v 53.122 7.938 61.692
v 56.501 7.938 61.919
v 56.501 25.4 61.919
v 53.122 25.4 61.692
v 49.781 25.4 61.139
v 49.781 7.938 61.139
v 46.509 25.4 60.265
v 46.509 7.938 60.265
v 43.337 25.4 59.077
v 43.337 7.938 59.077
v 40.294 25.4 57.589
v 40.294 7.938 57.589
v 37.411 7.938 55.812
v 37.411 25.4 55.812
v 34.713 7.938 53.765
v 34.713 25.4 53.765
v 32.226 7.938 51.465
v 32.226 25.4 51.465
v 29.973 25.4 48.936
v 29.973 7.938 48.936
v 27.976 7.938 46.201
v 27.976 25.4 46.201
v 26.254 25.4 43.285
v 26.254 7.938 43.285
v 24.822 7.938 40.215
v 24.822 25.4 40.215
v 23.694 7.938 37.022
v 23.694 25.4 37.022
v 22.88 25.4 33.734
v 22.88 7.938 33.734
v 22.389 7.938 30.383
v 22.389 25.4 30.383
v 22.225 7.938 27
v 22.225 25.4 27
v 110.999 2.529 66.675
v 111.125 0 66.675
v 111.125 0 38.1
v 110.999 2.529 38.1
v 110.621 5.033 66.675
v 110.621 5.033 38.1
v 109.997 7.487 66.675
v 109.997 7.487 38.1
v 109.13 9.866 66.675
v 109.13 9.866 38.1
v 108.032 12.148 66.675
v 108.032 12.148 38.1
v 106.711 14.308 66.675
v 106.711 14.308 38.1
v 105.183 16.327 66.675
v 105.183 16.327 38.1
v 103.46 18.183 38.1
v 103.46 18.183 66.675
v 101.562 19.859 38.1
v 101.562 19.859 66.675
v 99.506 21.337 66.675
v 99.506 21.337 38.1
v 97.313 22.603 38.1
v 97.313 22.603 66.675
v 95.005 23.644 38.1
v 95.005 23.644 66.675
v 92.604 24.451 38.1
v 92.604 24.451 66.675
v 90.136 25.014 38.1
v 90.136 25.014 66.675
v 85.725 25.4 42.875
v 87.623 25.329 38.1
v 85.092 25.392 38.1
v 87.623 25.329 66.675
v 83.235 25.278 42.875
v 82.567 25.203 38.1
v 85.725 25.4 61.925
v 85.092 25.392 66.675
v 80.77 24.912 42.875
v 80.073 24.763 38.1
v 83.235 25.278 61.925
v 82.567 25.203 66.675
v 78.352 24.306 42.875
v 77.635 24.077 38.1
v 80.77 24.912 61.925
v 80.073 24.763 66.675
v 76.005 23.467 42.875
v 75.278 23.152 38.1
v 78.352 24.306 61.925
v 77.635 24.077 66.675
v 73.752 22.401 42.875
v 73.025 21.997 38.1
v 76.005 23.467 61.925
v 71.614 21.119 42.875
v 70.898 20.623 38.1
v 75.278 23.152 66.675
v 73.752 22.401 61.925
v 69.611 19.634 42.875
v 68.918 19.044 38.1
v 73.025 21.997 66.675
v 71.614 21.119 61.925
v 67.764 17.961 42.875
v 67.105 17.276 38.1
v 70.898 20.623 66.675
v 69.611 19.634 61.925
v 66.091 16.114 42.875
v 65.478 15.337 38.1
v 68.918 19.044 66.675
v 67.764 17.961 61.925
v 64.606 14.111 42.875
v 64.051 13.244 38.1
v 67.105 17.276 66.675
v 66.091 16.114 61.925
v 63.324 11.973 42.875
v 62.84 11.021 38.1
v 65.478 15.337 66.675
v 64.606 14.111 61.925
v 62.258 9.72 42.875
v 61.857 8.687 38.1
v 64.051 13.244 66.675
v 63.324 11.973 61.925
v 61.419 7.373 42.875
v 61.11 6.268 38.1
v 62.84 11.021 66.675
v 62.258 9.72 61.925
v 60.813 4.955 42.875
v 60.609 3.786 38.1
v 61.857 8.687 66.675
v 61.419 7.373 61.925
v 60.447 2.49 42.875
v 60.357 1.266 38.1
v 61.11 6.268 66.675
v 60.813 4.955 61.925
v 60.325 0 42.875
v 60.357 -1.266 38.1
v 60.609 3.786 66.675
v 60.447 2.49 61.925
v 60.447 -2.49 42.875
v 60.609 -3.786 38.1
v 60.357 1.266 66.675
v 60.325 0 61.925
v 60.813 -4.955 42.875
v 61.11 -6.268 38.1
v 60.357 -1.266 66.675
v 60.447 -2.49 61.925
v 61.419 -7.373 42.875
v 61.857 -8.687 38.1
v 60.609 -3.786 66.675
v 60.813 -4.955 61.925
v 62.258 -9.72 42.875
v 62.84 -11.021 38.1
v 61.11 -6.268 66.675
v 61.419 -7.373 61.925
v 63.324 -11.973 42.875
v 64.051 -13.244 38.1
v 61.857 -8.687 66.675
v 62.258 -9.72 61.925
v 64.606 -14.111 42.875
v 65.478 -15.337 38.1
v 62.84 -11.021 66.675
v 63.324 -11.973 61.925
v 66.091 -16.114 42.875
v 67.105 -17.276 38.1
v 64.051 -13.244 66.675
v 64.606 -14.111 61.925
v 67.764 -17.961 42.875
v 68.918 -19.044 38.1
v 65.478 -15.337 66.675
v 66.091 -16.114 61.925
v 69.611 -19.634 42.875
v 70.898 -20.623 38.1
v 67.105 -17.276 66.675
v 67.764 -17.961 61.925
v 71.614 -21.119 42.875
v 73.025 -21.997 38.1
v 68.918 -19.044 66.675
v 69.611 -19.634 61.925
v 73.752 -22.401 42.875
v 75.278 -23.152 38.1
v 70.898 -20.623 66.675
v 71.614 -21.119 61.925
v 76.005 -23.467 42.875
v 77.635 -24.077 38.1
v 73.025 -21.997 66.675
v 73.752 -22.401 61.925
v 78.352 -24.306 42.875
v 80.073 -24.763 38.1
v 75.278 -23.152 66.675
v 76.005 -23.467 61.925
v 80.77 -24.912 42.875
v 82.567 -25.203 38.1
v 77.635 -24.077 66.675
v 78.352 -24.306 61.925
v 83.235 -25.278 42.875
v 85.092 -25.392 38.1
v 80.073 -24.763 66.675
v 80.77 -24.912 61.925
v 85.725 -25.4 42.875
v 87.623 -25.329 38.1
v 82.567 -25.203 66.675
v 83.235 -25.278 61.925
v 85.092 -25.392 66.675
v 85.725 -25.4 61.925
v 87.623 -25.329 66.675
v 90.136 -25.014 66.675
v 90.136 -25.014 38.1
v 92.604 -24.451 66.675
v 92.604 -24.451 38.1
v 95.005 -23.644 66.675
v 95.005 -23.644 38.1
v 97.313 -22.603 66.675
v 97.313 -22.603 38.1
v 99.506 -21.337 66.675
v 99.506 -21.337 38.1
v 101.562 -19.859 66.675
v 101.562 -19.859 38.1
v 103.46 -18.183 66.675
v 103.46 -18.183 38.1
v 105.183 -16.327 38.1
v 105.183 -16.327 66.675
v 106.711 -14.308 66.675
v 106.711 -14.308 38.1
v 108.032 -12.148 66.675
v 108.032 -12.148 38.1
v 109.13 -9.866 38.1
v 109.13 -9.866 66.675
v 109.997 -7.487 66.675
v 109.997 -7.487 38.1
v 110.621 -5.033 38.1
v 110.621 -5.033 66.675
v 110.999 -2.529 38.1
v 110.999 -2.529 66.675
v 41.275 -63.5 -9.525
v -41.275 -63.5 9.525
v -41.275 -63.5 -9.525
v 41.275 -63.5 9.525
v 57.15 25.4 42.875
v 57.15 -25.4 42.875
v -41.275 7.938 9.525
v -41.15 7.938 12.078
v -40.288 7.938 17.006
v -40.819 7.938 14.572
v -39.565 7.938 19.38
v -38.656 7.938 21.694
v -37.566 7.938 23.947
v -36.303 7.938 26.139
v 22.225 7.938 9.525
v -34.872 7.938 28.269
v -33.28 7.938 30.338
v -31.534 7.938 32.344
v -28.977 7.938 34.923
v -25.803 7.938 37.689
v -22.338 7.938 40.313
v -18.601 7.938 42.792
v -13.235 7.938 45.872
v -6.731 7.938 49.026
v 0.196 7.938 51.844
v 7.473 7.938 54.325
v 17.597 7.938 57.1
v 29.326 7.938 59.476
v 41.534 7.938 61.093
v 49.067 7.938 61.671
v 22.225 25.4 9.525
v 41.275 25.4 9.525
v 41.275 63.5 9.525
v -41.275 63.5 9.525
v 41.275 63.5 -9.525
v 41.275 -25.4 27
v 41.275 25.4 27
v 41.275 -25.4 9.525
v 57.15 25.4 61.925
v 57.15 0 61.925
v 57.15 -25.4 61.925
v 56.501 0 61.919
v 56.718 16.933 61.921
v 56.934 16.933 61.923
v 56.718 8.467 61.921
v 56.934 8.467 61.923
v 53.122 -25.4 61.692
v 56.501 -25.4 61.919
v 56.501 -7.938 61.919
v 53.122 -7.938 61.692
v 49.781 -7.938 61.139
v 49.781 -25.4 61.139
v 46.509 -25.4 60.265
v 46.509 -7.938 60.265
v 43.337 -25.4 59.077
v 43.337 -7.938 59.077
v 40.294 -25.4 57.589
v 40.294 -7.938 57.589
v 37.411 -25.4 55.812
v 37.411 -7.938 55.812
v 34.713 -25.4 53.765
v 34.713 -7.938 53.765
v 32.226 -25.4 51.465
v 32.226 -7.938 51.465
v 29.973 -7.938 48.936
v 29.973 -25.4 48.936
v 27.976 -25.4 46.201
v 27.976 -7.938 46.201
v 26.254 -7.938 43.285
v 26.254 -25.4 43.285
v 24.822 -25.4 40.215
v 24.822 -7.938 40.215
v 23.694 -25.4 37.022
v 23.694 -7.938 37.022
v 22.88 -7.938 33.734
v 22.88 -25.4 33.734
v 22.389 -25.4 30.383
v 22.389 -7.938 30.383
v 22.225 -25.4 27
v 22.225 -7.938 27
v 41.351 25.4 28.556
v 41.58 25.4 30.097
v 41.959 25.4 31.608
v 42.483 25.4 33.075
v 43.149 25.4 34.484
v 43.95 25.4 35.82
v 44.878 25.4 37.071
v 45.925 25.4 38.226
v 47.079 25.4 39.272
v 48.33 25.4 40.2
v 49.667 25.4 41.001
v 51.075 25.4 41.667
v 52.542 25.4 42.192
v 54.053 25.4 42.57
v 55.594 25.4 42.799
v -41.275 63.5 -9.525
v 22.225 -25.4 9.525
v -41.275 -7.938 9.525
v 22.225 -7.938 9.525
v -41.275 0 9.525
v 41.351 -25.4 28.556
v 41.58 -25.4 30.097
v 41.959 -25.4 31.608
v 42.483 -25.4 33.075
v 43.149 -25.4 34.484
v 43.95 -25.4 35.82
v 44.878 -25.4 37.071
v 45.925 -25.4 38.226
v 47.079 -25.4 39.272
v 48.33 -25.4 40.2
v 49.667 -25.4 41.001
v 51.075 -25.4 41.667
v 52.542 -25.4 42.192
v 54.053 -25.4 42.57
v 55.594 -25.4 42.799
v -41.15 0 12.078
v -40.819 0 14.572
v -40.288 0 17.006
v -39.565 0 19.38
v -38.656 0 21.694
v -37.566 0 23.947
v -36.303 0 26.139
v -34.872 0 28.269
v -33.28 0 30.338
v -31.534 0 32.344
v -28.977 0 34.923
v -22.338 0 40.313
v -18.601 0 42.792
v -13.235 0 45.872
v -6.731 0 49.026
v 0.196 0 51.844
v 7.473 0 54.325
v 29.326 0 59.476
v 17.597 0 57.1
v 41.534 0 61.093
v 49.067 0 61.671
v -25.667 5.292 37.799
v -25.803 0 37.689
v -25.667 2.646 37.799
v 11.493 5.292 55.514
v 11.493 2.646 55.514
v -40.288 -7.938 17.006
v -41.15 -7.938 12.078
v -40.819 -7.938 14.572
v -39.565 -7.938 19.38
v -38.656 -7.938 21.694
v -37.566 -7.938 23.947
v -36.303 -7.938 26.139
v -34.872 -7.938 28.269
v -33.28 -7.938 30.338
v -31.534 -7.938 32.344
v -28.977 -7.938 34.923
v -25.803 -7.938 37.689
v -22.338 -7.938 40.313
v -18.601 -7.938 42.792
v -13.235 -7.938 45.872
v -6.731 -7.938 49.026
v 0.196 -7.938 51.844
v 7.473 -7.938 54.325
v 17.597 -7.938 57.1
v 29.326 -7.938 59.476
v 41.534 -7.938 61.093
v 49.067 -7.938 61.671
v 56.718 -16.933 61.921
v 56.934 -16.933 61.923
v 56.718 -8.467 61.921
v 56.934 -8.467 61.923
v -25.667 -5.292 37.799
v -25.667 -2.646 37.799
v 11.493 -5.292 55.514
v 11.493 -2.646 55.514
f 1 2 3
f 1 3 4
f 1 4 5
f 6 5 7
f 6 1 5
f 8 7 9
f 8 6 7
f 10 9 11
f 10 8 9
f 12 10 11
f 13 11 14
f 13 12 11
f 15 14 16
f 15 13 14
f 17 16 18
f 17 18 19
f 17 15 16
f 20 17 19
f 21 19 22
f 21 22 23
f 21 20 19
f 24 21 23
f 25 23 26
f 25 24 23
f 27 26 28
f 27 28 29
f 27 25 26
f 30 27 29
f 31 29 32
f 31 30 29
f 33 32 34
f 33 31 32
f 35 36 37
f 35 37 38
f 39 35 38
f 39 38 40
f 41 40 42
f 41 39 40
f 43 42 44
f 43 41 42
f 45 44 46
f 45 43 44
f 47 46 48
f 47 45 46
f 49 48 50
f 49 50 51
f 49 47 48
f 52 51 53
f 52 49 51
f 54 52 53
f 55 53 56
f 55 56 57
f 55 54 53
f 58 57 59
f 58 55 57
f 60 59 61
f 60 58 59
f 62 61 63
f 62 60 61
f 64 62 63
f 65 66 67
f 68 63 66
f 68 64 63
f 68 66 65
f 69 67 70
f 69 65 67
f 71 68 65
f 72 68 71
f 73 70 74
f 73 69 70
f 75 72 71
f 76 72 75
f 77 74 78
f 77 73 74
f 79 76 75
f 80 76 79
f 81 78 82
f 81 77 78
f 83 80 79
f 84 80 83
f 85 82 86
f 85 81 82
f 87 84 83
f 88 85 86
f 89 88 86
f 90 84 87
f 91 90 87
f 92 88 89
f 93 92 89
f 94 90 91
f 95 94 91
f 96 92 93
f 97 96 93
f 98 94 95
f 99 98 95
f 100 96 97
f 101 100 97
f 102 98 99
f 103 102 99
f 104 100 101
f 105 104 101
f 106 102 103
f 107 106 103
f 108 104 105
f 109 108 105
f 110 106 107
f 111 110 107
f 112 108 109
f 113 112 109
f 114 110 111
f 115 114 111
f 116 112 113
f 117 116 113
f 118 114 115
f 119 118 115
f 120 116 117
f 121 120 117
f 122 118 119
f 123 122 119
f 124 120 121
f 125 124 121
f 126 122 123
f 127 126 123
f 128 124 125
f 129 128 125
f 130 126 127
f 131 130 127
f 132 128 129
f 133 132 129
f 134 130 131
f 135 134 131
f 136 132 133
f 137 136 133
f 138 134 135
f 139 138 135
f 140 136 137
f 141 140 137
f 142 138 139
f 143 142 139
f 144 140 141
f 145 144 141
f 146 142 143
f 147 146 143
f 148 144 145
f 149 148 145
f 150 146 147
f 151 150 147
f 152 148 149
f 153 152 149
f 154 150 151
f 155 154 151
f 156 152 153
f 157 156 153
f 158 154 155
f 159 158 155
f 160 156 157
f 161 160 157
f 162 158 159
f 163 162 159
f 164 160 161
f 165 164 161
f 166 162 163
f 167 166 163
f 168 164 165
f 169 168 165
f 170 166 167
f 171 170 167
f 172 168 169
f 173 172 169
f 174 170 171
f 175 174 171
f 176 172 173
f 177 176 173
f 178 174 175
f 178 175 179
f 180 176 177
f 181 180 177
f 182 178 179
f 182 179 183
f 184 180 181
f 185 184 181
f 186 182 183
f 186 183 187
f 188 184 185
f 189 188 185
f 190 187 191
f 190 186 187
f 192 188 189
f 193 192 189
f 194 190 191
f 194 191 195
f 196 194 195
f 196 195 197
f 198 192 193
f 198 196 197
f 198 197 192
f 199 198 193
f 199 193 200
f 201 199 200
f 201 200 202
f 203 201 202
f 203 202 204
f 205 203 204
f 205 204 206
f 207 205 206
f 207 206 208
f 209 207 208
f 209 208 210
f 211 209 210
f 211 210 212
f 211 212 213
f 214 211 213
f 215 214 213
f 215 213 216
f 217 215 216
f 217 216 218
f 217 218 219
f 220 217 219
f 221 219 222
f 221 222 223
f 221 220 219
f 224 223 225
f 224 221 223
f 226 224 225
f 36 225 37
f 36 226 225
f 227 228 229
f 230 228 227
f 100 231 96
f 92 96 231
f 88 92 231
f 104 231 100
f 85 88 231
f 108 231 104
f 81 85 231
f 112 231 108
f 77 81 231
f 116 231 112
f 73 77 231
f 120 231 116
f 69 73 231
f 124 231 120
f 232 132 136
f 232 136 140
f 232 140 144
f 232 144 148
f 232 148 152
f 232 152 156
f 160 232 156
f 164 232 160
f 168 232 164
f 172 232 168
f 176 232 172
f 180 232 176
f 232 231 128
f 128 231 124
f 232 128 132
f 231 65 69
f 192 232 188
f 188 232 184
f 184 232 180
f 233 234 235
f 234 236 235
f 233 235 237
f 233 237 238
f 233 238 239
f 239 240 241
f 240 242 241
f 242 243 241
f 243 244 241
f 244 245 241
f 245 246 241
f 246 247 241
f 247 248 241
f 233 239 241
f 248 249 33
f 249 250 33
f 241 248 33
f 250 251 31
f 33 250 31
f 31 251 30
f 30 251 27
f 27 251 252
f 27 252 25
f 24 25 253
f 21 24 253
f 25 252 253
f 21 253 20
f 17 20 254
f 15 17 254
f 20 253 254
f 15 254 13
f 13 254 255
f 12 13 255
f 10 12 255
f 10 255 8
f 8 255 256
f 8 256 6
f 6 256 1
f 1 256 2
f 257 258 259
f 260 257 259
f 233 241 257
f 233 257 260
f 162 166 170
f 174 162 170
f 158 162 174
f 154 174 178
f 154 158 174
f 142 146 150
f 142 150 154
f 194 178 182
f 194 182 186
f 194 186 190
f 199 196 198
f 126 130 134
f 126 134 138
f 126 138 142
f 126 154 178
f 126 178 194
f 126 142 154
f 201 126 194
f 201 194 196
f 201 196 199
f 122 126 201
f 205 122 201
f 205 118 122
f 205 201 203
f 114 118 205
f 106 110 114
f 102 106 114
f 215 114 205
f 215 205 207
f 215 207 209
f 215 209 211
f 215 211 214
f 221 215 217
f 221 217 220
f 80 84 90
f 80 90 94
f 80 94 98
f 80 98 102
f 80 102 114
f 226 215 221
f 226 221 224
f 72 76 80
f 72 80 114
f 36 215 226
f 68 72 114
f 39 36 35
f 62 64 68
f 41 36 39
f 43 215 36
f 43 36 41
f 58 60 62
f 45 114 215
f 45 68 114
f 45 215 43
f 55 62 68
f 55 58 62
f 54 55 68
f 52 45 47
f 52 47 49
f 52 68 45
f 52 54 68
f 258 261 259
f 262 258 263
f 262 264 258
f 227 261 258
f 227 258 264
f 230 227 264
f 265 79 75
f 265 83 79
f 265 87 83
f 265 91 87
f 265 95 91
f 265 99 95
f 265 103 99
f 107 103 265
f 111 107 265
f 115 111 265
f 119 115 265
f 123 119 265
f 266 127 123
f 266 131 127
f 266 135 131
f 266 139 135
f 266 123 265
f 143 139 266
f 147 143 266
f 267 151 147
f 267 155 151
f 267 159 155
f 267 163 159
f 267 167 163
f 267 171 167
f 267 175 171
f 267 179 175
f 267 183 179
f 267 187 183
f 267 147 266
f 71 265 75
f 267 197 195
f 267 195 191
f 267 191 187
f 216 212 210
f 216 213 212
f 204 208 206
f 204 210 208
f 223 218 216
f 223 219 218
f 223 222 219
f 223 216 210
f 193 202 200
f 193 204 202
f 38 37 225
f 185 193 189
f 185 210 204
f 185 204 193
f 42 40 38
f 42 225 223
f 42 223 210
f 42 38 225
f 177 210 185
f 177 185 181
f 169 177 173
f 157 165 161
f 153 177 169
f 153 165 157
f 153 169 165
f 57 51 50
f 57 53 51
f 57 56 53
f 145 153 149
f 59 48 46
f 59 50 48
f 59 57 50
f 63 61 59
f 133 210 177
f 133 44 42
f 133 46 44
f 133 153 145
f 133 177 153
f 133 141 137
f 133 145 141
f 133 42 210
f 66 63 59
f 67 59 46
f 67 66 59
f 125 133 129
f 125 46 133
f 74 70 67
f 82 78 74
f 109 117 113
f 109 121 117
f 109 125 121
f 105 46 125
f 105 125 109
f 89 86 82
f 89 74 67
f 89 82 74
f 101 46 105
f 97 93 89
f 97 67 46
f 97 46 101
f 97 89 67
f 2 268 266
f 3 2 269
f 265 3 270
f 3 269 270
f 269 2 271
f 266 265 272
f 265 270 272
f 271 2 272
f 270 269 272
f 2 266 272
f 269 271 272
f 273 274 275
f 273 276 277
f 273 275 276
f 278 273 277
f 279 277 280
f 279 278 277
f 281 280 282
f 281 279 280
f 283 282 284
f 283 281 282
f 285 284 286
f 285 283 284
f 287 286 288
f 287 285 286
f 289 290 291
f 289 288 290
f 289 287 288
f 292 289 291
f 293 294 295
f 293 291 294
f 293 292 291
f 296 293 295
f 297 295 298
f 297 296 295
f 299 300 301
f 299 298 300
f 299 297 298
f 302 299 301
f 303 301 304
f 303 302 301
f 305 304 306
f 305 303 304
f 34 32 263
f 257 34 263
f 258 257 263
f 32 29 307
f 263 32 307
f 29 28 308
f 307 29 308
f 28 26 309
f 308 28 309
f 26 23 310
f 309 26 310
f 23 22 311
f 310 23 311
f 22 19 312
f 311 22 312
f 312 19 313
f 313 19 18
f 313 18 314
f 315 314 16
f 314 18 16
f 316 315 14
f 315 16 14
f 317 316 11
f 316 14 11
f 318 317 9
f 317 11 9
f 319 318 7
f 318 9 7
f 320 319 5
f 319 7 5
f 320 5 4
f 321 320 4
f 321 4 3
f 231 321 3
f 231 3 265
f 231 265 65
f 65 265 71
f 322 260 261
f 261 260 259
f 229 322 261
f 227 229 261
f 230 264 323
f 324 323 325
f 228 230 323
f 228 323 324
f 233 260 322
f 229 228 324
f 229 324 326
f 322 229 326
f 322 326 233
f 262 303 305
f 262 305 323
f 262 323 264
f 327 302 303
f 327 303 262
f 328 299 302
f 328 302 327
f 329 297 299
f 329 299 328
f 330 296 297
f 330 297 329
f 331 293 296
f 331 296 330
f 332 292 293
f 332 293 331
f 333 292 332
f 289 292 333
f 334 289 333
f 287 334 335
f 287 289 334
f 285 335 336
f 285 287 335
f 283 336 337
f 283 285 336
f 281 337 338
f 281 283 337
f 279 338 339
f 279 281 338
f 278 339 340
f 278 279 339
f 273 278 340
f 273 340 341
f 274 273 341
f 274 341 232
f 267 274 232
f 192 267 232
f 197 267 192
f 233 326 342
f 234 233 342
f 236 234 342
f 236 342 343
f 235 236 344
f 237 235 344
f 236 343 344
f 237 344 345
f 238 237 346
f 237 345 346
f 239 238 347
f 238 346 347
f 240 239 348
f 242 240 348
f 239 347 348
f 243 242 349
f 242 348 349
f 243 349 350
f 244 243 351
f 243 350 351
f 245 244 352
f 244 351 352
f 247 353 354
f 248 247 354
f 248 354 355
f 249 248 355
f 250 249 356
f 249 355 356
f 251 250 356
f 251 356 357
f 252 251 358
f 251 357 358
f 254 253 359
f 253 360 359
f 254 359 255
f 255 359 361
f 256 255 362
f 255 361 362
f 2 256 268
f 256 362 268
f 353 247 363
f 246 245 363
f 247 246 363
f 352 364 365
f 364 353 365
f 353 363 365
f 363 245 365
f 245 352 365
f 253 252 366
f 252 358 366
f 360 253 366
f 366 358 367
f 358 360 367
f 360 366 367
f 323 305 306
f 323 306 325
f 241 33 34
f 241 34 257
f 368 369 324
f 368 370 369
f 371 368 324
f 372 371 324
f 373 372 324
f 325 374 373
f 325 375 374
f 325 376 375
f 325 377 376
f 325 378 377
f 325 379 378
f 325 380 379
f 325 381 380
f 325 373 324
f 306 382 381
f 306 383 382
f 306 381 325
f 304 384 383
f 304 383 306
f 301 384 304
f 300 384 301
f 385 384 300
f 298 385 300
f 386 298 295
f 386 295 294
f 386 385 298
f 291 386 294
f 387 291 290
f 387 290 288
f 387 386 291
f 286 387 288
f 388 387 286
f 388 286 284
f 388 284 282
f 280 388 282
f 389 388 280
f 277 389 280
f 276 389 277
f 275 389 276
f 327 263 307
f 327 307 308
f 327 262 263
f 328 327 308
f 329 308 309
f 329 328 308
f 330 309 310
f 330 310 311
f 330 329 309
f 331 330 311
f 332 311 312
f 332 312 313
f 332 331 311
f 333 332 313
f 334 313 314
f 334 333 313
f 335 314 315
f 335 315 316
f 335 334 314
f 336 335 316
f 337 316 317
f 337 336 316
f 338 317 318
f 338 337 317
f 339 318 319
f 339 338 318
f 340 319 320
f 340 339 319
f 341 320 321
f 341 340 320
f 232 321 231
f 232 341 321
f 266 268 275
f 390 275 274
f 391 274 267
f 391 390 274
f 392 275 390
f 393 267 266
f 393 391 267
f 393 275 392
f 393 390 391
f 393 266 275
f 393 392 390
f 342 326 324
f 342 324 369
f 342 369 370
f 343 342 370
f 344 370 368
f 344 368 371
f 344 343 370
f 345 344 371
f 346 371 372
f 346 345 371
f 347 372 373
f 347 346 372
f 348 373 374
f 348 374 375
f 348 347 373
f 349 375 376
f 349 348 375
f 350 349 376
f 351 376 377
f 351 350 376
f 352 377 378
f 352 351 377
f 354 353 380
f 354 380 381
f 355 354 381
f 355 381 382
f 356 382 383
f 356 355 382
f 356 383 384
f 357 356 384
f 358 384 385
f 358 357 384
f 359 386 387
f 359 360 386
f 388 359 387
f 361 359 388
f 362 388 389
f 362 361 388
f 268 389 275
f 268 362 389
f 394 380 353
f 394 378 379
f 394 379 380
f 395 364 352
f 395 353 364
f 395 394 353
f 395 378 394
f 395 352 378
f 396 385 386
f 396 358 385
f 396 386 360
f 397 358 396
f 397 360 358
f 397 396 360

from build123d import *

# Parameters (mm, degrees)
F1_DEPTH = 63.5
F0_W     = 25.4
F0_H     = 19.05
F2_DEPTH = 25.4
F3_DEPTH = 7.9375


with BuildPart() as f1:
    # F0 (on Front) → F1 (new body, symmetric)
    with BuildSketch(Plane.XZ):
        Polygon((41.275, -9.525), (41.275, 9.525), (22.225, 9.525), (-41.275, 9.525), (-41.275, -9.525), align=None)
    extrude(amount=F1_DEPTH, both=True)

    # F0 (on Front) → F2 (join, symmetric)
    with BuildSketch(Plane.XZ):
        with Locations((73.025, 52.4002)):
            Rectangle(F0_W, F0_H)
        with BuildLine():
            Line((22.225, 9.525), (41.275, 9.525))
            Line((41.275, 9.525), (41.275, 27.0002))
            ThreePointArc((41.275, 27.0002), (45.9246798487, 38.2255201513), (57.15, 42.8752))
            Line((57.15, 42.8752), (60.325, 42.8752))
            Line((60.325, 42.8752), (60.325, 61.9252))
            Line((60.325, 61.9252), (57.15, 61.9252))
            add(Edge.make_bspline(
                [(56.5012045557, 61.9191732018), (56.7176813498, 61.9216130278), (56.9339488866, 61.9236220913), (57.15, 61.9252)],
                knots=[110.9630693968, 110.9630693968, 110.9630693968, 110.9630693968, 111.5045361635, 111.5045361635, 111.5045361635, 111.5045361635], degree=3))
            ThreePointArc((56.5012045557, 61.9191732018), (32.2259673619, 51.4654451869), (22.225, 27.0002))
            Line((22.225, 27.0002), (22.225, 9.525))
        make_face()
    extrude(amount=F2_DEPTH, both=True)

    # F0 (on Front) → F3 (join, symmetric)
    with BuildSketch(Plane.XZ):
        with BuildLine():
            Line((-41.275, 9.525), (22.225, 9.525))
            Line((22.225, 9.525), (22.225, 27.0002))
            ThreePointArc((22.225, 27.0002), (32.2259673619, 51.4654451869), (56.5012045557, 61.9191732018))
            add(Edge.make_bspline(
                [(-41.275, 9.525), (-41.0122764768, 42.8286605667), (12.1385012456, 61.4191783861), (56.5012045557, 61.9191732018)],
                knots=[0, 0, 0, 0, 110.9630693968, 110.9630693968, 110.9630693968, 110.9630693968], degree=3))
        make_face()
    extrude(amount=F3_DEPTH, both=True)

    # F0 (on Front) → F4 (revolve)
    with BuildSketch(Plane.XZ):
        Polygon((85.725, 61.9252), (85.725, 42.8752), (85.725, 38.1), (111.125, 38.1), (111.125, 66.675), (85.725, 66.675), align=None)
    revolve(axis=Axis((85.725, 0, 52.3875), (0, 0, 1)))


solid = f1.part
